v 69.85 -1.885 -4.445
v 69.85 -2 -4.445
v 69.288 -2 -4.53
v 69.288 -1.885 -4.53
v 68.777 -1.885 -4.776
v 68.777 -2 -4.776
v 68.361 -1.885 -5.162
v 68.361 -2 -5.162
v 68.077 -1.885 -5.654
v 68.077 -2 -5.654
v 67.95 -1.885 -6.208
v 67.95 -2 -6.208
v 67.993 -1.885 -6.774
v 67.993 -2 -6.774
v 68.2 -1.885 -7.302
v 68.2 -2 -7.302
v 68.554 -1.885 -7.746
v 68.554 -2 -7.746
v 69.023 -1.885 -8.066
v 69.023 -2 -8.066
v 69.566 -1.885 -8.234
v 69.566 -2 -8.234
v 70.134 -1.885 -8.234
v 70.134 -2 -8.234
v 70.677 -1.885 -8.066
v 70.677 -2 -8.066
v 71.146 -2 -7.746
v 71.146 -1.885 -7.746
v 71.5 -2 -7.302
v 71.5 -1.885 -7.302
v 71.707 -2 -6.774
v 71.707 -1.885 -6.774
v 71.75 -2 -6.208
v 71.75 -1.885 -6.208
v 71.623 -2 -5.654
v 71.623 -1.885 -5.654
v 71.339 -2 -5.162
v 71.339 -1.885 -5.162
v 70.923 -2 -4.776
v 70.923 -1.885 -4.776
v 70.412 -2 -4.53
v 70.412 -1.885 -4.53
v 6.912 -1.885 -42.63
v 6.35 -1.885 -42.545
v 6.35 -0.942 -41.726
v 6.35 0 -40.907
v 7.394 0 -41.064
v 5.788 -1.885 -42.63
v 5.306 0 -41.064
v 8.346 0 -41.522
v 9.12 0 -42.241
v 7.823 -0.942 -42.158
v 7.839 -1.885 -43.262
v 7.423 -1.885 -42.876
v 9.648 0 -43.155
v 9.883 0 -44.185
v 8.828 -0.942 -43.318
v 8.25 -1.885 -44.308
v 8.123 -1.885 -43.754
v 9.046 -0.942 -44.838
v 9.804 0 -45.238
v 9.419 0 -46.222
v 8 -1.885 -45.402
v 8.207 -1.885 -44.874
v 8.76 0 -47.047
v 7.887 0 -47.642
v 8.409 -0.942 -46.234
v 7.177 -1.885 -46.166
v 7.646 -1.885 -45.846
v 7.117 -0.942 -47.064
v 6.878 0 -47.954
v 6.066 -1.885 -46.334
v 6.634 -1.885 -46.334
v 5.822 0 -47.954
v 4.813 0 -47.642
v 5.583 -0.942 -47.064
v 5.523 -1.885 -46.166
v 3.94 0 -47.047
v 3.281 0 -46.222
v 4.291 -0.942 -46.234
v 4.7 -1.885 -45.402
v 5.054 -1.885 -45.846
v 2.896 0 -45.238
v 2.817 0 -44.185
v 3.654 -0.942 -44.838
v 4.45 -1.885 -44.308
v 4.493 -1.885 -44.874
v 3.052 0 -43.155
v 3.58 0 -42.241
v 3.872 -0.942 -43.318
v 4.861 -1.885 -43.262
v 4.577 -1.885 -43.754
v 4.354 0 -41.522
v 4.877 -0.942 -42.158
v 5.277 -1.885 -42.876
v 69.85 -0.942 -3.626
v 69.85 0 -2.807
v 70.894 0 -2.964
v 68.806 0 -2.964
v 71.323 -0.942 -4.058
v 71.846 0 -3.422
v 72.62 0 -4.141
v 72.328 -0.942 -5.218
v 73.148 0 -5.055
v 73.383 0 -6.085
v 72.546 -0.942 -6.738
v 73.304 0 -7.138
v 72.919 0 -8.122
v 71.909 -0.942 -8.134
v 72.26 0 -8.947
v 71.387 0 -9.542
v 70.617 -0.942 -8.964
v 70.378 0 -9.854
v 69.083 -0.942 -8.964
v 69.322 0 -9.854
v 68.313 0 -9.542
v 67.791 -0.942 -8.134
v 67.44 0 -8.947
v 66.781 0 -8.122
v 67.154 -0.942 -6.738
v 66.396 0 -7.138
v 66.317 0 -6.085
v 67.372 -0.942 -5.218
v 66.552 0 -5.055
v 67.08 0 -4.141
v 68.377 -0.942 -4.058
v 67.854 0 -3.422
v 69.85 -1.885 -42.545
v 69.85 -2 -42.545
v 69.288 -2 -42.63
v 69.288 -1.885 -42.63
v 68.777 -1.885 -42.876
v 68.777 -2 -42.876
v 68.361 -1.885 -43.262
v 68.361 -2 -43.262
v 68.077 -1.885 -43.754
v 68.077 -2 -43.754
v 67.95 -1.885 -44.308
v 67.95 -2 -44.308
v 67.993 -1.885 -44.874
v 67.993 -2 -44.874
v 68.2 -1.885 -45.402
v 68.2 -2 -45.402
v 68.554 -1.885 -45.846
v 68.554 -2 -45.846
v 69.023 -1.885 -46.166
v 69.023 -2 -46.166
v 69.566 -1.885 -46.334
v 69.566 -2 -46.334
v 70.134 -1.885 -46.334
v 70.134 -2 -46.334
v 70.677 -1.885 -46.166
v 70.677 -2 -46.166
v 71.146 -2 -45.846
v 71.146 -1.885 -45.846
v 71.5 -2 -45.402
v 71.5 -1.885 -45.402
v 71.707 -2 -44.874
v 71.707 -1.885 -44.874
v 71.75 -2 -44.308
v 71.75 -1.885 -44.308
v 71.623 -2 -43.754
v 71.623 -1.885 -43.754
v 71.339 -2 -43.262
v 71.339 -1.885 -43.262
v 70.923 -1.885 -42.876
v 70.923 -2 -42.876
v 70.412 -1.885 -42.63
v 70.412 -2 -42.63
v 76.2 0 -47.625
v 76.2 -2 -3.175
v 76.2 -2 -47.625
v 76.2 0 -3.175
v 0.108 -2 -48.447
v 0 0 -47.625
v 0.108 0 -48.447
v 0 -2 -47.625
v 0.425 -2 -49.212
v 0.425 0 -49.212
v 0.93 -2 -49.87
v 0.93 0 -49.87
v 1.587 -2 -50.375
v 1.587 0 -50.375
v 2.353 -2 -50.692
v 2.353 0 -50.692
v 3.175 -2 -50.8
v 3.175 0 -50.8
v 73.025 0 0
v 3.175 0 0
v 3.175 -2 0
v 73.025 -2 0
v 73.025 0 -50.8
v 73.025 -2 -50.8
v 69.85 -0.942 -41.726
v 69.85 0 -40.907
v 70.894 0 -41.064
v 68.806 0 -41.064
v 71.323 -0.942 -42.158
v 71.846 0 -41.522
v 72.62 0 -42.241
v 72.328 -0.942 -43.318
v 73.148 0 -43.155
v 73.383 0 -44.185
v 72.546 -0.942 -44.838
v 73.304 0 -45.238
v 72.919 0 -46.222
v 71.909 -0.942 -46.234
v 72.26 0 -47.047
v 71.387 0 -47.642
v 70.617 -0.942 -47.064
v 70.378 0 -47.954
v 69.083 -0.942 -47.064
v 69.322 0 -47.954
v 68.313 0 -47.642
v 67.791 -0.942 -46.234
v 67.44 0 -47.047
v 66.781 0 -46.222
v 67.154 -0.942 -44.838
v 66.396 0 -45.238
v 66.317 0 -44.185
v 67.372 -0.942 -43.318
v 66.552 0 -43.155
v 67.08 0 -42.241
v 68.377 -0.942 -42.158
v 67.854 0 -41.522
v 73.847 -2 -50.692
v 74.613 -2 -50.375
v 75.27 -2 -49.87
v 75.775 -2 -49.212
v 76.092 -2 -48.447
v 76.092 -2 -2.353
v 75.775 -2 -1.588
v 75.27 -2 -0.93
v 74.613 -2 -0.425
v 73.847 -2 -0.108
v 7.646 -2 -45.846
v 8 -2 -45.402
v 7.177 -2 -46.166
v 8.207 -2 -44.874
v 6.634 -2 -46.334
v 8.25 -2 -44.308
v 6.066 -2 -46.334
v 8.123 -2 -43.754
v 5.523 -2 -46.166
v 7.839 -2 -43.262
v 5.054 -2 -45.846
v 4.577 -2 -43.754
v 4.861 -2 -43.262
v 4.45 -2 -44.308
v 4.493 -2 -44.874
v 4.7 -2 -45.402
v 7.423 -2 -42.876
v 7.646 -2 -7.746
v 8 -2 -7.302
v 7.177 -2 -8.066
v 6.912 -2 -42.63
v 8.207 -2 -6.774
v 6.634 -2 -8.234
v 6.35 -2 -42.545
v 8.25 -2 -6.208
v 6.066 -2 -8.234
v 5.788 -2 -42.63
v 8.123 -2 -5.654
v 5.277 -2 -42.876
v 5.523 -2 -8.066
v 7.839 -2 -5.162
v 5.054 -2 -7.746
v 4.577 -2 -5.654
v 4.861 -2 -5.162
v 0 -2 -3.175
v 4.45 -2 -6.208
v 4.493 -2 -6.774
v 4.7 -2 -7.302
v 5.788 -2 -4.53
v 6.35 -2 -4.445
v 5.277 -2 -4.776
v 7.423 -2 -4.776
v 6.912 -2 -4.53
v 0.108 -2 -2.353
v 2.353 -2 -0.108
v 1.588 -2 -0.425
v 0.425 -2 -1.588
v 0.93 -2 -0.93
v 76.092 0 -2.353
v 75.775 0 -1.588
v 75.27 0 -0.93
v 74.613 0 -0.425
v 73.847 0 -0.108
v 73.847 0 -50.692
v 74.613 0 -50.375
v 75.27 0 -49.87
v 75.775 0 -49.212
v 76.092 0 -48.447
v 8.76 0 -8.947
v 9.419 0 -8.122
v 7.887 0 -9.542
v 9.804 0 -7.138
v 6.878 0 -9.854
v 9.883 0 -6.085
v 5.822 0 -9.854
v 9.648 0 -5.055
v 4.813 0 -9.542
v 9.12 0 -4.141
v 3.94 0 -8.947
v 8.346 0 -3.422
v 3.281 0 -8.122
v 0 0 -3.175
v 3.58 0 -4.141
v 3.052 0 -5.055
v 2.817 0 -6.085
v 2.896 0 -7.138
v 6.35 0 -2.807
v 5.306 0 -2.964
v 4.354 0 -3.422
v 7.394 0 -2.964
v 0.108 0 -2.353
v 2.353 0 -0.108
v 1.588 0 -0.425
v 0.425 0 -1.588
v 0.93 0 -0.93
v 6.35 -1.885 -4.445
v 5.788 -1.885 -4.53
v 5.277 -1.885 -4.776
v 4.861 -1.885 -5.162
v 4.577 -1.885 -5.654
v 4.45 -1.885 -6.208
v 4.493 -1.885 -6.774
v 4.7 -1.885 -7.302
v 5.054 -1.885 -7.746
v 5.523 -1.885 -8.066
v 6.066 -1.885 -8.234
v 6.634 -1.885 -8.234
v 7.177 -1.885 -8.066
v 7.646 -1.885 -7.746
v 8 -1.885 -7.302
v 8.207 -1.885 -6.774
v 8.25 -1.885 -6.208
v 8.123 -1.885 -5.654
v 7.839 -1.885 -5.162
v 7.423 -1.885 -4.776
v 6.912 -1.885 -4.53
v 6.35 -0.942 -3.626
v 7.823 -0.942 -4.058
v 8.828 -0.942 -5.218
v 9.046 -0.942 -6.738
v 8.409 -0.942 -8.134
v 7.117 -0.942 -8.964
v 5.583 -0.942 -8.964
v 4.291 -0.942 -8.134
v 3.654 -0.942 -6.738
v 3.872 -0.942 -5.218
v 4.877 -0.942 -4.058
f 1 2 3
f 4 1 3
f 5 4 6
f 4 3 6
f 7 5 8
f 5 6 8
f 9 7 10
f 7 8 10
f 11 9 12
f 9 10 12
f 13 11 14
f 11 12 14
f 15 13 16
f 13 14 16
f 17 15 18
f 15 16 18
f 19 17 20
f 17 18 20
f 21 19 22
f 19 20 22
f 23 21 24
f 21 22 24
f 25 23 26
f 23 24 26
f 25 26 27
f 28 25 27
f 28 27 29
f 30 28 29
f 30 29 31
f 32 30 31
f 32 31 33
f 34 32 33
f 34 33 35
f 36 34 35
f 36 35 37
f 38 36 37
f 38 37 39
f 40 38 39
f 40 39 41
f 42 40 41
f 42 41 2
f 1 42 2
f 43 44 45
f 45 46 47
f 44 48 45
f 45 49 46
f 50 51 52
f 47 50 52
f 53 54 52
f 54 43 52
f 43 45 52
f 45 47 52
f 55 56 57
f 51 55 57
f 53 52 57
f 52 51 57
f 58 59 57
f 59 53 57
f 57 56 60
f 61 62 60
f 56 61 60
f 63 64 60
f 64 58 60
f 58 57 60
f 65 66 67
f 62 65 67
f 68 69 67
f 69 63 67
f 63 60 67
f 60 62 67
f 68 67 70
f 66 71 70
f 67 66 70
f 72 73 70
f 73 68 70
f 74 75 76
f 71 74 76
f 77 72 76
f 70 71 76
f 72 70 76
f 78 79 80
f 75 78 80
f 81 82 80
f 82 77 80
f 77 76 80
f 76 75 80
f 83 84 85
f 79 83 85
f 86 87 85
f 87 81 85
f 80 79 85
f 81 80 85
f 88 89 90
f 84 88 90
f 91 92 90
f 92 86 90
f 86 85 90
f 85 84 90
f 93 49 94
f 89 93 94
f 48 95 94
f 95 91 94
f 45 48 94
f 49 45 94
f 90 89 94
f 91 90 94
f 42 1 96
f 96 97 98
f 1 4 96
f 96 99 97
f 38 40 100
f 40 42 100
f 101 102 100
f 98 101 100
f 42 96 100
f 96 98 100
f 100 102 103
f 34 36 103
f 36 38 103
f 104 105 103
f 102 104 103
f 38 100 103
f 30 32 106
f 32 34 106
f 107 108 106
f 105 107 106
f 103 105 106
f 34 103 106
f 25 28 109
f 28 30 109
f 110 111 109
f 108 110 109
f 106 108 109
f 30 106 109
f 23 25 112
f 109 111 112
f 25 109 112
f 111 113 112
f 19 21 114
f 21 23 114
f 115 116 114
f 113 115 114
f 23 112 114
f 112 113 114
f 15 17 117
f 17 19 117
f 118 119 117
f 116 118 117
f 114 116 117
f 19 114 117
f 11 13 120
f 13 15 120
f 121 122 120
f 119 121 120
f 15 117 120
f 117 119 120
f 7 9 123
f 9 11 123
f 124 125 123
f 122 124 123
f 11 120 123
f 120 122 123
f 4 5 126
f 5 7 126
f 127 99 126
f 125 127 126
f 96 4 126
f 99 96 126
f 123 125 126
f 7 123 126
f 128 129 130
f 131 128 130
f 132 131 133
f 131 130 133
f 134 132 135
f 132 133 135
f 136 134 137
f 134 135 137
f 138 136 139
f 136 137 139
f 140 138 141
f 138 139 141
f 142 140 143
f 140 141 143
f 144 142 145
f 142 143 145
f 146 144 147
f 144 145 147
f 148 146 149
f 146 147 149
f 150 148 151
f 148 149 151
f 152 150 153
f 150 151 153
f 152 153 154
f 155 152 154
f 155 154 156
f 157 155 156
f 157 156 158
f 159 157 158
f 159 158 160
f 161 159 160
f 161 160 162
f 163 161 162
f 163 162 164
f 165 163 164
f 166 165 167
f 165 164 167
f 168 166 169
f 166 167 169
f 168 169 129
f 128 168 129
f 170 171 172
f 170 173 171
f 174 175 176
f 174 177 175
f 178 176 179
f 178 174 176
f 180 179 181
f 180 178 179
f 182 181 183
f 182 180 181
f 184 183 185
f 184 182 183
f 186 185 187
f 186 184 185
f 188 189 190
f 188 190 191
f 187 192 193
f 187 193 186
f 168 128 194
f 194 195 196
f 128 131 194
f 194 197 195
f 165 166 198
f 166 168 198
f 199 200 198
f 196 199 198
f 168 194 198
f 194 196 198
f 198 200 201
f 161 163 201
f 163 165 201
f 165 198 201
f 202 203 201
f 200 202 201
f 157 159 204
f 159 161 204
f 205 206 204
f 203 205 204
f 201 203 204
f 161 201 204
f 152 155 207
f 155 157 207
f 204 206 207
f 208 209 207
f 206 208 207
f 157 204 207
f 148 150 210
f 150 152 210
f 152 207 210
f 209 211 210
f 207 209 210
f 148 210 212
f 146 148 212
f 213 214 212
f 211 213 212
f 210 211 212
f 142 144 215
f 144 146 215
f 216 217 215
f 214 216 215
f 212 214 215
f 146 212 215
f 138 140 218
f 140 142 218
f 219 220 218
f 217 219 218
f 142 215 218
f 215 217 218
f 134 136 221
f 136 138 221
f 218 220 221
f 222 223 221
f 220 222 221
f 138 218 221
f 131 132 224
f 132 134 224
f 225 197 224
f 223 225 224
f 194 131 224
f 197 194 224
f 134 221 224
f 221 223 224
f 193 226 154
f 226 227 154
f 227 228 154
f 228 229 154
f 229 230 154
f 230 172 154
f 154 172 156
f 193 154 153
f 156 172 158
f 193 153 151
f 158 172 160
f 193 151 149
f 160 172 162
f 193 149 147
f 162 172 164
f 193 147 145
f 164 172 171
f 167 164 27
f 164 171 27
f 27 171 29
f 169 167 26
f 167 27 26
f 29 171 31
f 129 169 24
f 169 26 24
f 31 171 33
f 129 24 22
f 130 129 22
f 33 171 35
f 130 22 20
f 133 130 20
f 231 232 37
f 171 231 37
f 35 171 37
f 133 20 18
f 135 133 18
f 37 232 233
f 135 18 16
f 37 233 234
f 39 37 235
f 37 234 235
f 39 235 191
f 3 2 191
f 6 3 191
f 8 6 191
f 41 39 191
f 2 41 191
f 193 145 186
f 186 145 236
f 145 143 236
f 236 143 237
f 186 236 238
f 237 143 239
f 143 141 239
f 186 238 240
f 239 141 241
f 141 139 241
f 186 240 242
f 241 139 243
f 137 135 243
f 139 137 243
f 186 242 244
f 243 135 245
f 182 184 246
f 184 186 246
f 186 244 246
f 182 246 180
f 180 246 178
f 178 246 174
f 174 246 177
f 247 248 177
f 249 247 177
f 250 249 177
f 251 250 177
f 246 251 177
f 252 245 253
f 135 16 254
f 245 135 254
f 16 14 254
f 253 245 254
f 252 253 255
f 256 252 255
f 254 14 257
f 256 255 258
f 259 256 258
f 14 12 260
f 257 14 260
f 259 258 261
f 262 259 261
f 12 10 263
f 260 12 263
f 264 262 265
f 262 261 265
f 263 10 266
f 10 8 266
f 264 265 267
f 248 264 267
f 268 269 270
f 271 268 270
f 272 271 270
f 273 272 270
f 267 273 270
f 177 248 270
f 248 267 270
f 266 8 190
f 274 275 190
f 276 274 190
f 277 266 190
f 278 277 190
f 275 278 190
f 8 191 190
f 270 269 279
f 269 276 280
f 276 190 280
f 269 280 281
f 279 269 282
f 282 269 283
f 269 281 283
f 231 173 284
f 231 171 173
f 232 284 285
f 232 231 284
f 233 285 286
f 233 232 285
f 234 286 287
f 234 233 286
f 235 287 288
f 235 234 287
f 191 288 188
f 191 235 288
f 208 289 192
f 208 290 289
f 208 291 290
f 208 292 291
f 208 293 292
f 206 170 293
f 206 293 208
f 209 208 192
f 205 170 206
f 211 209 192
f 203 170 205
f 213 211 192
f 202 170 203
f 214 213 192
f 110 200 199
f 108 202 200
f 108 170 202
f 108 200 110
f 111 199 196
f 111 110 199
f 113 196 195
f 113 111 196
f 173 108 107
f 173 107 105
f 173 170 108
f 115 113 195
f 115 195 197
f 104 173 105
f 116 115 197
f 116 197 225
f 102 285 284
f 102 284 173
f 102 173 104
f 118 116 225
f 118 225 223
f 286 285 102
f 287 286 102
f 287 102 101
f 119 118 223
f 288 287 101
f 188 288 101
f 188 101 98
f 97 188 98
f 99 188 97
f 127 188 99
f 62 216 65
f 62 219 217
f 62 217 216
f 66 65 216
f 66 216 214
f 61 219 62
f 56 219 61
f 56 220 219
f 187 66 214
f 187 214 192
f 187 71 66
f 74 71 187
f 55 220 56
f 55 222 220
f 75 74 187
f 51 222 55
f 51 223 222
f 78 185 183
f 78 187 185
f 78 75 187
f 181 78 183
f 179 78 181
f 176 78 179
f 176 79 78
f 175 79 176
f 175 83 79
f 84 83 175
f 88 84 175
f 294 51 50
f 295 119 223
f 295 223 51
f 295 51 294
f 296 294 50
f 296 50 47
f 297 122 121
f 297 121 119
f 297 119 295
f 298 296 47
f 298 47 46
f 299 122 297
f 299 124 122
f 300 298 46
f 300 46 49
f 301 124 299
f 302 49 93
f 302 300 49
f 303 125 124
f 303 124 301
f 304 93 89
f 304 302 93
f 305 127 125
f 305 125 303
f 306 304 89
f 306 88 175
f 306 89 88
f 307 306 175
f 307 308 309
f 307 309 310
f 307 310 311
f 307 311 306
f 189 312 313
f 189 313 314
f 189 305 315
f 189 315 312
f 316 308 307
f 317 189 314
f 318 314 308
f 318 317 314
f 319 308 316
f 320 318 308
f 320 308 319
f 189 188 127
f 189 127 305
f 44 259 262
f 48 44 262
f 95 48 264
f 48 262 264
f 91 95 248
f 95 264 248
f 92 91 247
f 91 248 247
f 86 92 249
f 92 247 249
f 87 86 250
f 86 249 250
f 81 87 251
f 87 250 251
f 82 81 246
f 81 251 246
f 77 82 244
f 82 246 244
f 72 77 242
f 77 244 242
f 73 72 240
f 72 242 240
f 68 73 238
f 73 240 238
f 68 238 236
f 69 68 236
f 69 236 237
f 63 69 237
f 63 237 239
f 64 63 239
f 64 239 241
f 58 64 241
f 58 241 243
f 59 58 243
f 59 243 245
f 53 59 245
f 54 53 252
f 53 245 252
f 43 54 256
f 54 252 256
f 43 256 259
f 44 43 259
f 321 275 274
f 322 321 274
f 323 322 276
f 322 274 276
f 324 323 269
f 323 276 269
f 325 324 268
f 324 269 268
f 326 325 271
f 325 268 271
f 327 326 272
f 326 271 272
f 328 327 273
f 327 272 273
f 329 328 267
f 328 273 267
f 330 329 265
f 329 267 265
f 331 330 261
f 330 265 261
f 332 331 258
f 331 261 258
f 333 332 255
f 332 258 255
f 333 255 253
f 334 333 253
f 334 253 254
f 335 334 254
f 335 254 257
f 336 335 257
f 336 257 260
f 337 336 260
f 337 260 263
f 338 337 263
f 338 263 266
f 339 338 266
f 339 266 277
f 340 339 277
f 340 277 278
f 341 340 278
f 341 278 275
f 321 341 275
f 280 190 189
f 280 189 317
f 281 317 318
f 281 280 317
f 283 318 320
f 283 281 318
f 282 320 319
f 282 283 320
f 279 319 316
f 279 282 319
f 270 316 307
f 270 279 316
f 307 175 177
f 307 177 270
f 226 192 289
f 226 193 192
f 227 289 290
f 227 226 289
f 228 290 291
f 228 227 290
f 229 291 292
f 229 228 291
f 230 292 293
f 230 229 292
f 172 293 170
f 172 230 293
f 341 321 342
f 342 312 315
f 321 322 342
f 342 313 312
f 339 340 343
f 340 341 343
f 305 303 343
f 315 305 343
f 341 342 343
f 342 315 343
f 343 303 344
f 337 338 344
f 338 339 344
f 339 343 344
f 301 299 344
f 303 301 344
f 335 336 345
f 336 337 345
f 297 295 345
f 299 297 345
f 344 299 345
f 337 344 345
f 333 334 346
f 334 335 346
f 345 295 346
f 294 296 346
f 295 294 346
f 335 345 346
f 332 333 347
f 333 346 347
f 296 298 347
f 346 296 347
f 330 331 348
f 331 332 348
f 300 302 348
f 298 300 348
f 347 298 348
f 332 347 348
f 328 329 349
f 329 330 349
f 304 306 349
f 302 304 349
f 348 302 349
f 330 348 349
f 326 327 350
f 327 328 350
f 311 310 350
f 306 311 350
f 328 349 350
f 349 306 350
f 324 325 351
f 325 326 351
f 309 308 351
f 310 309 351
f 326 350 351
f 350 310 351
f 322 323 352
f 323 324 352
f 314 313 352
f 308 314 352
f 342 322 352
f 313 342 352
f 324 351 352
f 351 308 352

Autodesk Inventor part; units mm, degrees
ref_plane "YZ Plane" through (0, 0, 0) normal (1, 0, 0) x (0, 1, 0)
ref_plane "XZ Plane" through (0, 0, 0) normal (0, 1, 0) x (-1, 0, 0)
ref_plane "XY Plane" through (0, 0, 0) normal (0, 0, 1) x (1, 0, 0)
sketch "Sketch1" plane through (0, 0, 0) normal (0, 1, 0) x (-1, 0, 0)
  line L0 (0, 0) -> (-76.2, 0)
  line L1 (-76.2, 0) -> (-76.2, -50.8)
  line L2 (-76.2, -50.8) -> (0, -50.8)
  line L3 (0, -50.8) -> (0, 0)
  line L4 (0, -25.4) -> (-76.2, -25.4)
  line L5 (-38.1, -50.8) -> (-38.1, 0)
  line L6 (-6.35, -44.45) -> (-69.85, -44.45) construction
  line L7 (-69.85, -44.45) -> (-69.85, -6.35) construction
  line L8 (-69.85, -6.35) -> (-6.35, -6.35) construction
  line L9 (-6.35, -6.35) -> (-6.35, -44.45) construction
  line L10 (-6.35, -44.45) -> (-69.85, -6.35) construction
  line L11 (-69.85, -44.45) -> (-6.35, -6.35) construction
  point P0 (-38.1, -25.4)
  dimension "d0" = 76.2
  dimension "d1" = 50.8
  dimension "d2" = 63.5
  dimension "d3" = 38.1
extrude "Plate1" add sketch "Sketch1" against normal blind 2
hole "Mounting Hole" at (6.35, 0, -44.45) direction (0, -1, 0) diameter 3.81 end through all countersink diameter 7.0866 countersink angle 82 clearance for "Flat Head Machine Screw (82)" size "#6" standard "Ansi Unified Screw Threads"
pattern_sketch "Mounting Holes" of "Mounting Hole" from (6.35, 0, -44.45) copies at (69.85, 0, -44.45) at (69.85, 0, -6.35) at (6.35, 0, -6.35)
fillet "Corner Round1" radius 3.175 4 edges at (0, -1, -50.8) (76.2, -1, -50.8) (76.2, -1, 0) (0, -1, 0)
sketch "Sketch2" plane through (0, 0, 0) normal (0, 1, 0) x (1, 0, 0)
  line L0 (5.9151, 38.1317) -> (36.83, 38.1317) construction
  line L1 (36.83, 38.1317) -> (36.83, 35.0837) construction
  line L2 (36.83, 35.0837) -> (5.9151, 35.0837) construction
  line L3 (5.9151, 35.0837) -> (5.9151, 38.1317) construction
  line L4 (5.9151, 31.2737) -> (36.83, 31.2737) construction
  line L5 (36.83, 31.2737) -> (36.83, 28.2258) construction
  line L6 (36.83, 28.2258) -> (5.9151, 28.2257) construction
  line L7 (5.9151, 28.2257) -> (5.9151, 31.2737) construction
  line L8 (11.7398, 18.288) -> (64.4602, 18.288) construction
  line L9 (64.4602, 18.288) -> (64.4602, 8.128) construction
  line L10 (64.4602, 8.128) -> (11.7398, 8.128) construction
  line L11 (11.7398, 8.128) -> (11.7398, 18.288) construction
  line L12 (21.6232, 5.588) -> (54.5768, 5.588) construction
  line L13 (54.5768, 5.588) -> (54.5768, 2.54) construction
  line L14 (54.5768, 2.54) -> (21.6232, 2.54) construction
  line L15 (21.6232, 2.54) -> (21.6232, 5.588) construction
  line L16 (5.9151, 24.4157) -> (36.83, 24.4157) construction
  line L17 (36.83, 24.4157) -> (36.83, 21.3677) construction
  line L18 (36.83, 21.3677) -> (5.9151, 21.3677) construction
  line L19 (5.9151, 21.3677) -> (5.9151, 24.4157) construction
  circle A0 centre (6.35, 6.35) radius 3.5433 construction
  circle A1 centre (69.85, 6.35) radius 3.5433 construction
  circle A2 centre (69.85, 44.45) radius 3.5433 construction
  circle A3 centre (6.35, 44.45) radius 3.5433 construction
  arc A4 (0, 3.175) -> (3.175, 0) centre (3.175, 3.175) ccw construction
  line L20 (3.175, 0) -> (73.025, 0) construction
  arc A5 (73.025, 0) -> (76.2, 3.175) centre (73.025, 3.175) ccw construction
  line L21 (76.2, 3.175) -> (76.2, 47.625) construction
  arc A6 (76.2, 47.625) -> (73.025, 50.8) centre (73.025, 47.625) ccw construction
  line L22 (73.025, 50.8) -> (3.175, 50.8) construction
  arc A7 (3.175, 50.8) -> (0, 47.625) centre (3.175, 47.625) ccw construction
  line L23 (0, 47.625) -> (0, 3.175) construction
  circle A8 centre (6.35, 44.45) radius 6.35 construction
  line L24 (73.025, 50.8) -> (3.175, 50.8) projected
  line L25 (38.1, 50.8) -> (38.1, 0) construction
  line L26 (0, 25.4) -> (76.2, 25.4) construction
  circle A9 centre (69.85, 44.45) radius 6.35 construction
  circle A10 centre (6.35, 6.35) radius 6.35 construction
  circle A11 centre (69.85, 6.35) radius 6.35 construction
  line L27 (39.37, 39.1478) -> (64.77, 39.1478)
  line L28 (64.77, 39.1478) -> (64.77, 34.0678)
  line L29 (64.77, 34.0678) -> (39.37, 34.0677)
  line L30 (39.37, 34.0677) -> (39.37, 39.1478)
  line L31 (39.37, 32.2897) -> (64.77, 32.2898)
  line L32 (64.77, 32.2898) -> (64.77, 27.2097)
  line L33 (64.77, 27.2097) -> (39.37, 27.2097)
  line L34 (39.37, 27.2097) -> (39.37, 32.2897)
  line L35 (39.37, 25.4317) -> (64.77, 25.4318)
  line L36 (64.77, 25.4318) -> (64.77, 20.3517)
  line L37 (64.77, 20.3517) -> (39.37, 20.3517)
  line L38 (39.37, 20.3517) -> (39.37, 25.4317)
  line L39 (13.2579, 48.26) -> (62.9421, 48.26) construction
  line L40 (62.9421, 48.26) -> (62.9421, 41.2115) construction
  line L41 (62.9421, 41.2115) -> (13.2579, 41.2115) construction
  line L42 (13.2579, 41.2115) -> (13.2579, 48.26) construction
  point P0 (38.1, 18.288)
  point P1 (38.1, 25.4)
  point P2 (38.1, 5.588)
  point P3 (38.1, 25.4)
  point P4 (39.37, 22.8917)
  point P5 (36.83, 22.8917)
  point P6 (39.37, 29.7497)
  point P7 (36.83, 29.7497)
  point P8 (39.37, 36.6077)
  point P9 (36.83, 36.6077)
  point P10 (38.1, 41.2115)
  dimension "d24" = 2.54
  dimension "d25" = 3.048
  dimension "d26" = 10.16
  dimension "d27" = 2.54
  dimension "d28" = 3.048
  dimension "d29" = 3.048
  dimension "d30" = 3.048
  dimension "d31" = 3.81
  dimension "d32" = 3.81
  dimension "d33" = 2.54
  dimension "d34" = 3.0798
  dimension "d35" = 2.54
  dimension "d36" = 25.4
  dimension "d37" = 5.08
  dimension "d38" = 7.0485
  dimension "d39" = 2.54
  dimension "d40" = 3.0798
mark "Mark1"
equation "\"d11\" = Thickness"
equation "\"d5\" = Thickness"
equation "\"largeTextHeight\" = 3.048"
equation "\"smallTextHeight\" = 2.54"
equation "\"Thickness\" = 2"
properties part number "Jack Plate" material "Aluminum 6061"
